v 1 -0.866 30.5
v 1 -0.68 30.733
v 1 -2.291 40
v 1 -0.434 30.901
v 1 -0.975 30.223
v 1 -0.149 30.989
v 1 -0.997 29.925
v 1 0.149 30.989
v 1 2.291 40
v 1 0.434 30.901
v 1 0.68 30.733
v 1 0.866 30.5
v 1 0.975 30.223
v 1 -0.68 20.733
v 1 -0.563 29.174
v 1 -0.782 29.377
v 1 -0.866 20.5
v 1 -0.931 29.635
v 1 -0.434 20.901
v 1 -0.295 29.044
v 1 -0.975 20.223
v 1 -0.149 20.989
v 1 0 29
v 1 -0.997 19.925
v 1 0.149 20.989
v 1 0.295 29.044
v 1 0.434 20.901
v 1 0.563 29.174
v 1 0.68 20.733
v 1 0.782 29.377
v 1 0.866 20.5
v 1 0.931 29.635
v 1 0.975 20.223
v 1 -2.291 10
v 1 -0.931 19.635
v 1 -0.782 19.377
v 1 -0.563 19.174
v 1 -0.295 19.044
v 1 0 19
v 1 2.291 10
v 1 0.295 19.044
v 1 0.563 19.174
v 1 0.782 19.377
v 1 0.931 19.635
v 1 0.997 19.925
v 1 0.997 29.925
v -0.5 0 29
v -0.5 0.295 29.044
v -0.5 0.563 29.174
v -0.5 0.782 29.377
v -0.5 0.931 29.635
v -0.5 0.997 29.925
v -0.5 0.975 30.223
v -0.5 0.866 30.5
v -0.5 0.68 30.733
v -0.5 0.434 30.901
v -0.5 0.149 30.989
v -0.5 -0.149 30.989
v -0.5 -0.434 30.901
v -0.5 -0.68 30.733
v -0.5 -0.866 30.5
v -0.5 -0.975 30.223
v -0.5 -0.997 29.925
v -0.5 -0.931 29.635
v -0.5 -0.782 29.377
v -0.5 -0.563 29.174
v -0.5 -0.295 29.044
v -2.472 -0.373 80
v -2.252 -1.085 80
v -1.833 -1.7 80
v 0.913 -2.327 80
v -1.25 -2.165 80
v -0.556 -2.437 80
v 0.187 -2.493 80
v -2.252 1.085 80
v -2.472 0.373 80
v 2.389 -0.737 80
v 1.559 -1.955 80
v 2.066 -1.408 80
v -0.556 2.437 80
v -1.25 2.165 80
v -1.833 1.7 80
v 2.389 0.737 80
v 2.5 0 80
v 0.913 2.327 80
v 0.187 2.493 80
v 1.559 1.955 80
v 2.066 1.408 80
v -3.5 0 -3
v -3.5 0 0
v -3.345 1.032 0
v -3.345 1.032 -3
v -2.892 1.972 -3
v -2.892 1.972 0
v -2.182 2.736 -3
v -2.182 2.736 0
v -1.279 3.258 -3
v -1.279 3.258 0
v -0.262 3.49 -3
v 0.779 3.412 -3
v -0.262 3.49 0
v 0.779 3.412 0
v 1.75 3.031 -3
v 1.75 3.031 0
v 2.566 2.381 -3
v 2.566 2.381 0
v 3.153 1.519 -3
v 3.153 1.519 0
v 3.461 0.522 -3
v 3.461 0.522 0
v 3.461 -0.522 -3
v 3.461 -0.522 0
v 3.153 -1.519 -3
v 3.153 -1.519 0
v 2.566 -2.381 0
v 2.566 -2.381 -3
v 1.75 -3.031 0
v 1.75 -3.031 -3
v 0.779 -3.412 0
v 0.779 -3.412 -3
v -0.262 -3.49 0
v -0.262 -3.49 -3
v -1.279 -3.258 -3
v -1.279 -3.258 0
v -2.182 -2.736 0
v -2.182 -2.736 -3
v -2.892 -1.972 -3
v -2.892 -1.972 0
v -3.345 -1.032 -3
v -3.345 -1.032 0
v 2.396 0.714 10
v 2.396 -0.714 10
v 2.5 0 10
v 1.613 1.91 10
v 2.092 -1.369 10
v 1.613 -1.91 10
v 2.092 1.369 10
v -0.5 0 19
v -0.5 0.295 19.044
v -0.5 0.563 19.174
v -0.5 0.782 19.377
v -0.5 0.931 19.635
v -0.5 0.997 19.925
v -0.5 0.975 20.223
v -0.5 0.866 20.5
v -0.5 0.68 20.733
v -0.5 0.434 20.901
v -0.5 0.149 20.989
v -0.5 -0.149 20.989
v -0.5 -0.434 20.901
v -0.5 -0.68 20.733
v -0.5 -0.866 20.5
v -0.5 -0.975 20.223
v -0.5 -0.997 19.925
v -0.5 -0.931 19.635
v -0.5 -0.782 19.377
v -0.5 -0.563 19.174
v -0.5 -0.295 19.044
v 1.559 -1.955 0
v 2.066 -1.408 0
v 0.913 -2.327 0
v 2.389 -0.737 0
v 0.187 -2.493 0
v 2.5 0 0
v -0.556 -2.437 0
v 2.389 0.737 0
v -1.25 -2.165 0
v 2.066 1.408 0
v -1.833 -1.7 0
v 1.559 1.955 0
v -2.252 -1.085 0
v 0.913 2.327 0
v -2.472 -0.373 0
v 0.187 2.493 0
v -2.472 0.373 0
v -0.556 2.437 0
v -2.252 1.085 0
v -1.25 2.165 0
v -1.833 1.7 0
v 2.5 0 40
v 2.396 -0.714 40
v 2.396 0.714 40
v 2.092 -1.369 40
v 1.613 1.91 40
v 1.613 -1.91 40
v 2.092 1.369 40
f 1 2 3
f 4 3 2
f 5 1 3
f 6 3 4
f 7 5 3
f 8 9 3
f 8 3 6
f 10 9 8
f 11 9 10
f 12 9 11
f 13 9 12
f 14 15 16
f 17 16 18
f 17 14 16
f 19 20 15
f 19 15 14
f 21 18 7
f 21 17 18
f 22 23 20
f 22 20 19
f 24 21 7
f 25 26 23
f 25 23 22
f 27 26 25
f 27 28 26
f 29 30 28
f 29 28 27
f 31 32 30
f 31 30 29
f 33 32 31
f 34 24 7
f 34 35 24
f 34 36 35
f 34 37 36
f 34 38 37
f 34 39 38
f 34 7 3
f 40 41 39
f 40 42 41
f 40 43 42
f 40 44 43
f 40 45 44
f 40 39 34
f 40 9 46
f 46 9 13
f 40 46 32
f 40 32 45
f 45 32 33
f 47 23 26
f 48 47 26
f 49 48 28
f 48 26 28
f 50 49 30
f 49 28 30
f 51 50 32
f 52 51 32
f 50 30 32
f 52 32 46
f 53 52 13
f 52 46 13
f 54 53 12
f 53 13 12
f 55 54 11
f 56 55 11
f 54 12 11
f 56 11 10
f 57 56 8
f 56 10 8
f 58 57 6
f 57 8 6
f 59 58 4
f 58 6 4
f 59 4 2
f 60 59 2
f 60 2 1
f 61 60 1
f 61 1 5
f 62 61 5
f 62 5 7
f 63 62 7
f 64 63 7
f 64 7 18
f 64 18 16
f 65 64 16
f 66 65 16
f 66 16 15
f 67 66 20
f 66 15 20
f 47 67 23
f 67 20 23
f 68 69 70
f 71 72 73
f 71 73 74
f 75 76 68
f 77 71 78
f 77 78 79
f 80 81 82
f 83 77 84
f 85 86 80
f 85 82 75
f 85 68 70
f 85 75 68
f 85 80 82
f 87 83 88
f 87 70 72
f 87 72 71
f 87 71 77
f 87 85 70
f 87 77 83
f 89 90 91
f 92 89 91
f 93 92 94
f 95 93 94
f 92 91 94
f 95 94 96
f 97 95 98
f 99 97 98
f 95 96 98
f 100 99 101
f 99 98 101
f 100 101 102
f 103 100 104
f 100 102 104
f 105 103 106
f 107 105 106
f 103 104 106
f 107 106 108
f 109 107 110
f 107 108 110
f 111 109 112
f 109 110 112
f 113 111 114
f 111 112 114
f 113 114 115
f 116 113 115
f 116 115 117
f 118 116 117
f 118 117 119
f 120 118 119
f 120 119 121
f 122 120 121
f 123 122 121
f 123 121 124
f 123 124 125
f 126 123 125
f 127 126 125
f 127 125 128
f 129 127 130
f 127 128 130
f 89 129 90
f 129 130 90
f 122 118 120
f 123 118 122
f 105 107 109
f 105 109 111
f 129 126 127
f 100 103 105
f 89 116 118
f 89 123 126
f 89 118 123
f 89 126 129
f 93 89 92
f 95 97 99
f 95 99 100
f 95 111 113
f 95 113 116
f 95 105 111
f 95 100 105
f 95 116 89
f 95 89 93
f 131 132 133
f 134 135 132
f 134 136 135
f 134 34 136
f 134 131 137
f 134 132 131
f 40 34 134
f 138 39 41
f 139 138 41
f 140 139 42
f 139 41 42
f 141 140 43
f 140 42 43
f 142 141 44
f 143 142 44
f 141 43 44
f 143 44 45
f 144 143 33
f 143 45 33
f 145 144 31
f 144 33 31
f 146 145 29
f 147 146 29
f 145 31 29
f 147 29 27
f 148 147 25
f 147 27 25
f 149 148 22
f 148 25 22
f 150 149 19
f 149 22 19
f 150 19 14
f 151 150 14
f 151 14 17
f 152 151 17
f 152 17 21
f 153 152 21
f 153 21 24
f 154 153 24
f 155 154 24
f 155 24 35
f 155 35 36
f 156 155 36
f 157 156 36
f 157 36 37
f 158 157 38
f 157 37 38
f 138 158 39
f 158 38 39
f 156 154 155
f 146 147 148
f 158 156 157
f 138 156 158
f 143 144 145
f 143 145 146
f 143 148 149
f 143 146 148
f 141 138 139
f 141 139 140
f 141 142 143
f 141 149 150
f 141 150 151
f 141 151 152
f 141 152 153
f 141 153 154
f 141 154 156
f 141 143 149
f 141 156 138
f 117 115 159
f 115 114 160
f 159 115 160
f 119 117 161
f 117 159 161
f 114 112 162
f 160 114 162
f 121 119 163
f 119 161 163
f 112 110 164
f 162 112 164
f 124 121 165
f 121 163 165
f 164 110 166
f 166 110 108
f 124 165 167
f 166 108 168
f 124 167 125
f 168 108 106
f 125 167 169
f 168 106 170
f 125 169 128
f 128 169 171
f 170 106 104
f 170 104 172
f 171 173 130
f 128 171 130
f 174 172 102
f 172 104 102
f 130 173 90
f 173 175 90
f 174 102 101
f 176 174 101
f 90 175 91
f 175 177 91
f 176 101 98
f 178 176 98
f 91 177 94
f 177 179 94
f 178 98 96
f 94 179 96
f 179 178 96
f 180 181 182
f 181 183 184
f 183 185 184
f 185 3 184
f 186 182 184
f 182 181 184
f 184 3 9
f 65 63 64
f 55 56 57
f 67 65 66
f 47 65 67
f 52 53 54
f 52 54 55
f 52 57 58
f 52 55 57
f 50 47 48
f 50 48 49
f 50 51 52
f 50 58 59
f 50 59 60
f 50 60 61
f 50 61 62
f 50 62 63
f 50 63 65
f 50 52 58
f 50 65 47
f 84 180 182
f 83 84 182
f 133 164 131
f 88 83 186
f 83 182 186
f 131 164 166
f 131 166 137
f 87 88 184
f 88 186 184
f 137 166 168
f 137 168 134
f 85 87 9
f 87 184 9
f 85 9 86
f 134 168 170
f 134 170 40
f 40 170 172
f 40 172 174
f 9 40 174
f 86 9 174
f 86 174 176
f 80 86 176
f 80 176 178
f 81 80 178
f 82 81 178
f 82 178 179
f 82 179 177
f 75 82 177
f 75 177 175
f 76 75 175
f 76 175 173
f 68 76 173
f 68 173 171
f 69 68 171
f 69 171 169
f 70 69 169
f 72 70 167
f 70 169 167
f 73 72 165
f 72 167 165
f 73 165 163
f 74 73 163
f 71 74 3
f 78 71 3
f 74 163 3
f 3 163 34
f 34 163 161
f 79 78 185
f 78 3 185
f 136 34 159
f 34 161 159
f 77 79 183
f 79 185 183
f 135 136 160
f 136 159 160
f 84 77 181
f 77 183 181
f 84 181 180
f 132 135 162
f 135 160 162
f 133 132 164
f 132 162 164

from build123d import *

# Parameters (mm, degrees)
ESQUISSE1_R             = 2.5
BOSS_EXTRU_1_DEPTH      = 80
ESQUISSE2_R             = 3.5
BOSS_EXTRU_2_DEPTH      = 3
ESQUISSE3_W             = 30
ESQUISSE3_H             = 5
ENL_V_MAT_EXTRU_1_DEPTH = 3
ESQUISSE4_R             = 1
ENL_V_MAT_EXTRU_2_DEPTH = 1.5


with BuildPart() as part:
    # Esquisse1 → Boss.-Extru.1 (new body)
    with BuildSketch(Plane.XY):
        Circle(ESQUISSE1_R)
    extrude(amount=BOSS_EXTRU_1_DEPTH)

    # Esquisse2 → Boss.-Extru.2 (add)
    with BuildSketch(Plane(origin=(0, 0, 0), x_dir=(-1, 0, 0), z_dir=(0, 0, -1))):
        Circle(ESQUISSE2_R)
    extrude(amount=BOSS_EXTRU_2_DEPTH)

    # Esquisse3 → Enlèv. mat.-Extru.1 (cut)
    with BuildSketch(Plane(origin=(1, 0, 0), x_dir=(0, 0, -1), z_dir=(1, 0, 0))):
        with Locations((-25, 0)):
            Rectangle(ESQUISSE3_W, ESQUISSE3_H)
    extrude(amount=ENL_V_MAT_EXTRU_1_DEPTH, mode=Mode.SUBTRACT)

    # Esquisse4 → Enlèv. mat.-Extru.2 (cut)
    with BuildSketch(Plane(origin=(1, 0, 0), x_dir=(0, 0, -1), z_dir=(1, 0, 0))):
        with Locations((-30, 0)):
            Circle(ESQUISSE4_R)
        with Locations((-20, 0)):
            Circle(ESQUISSE4_R)
    extrude(amount=-ENL_V_MAT_EXTRU_2_DEPTH, mode=Mode.SUBTRACT)


solid = part.part
